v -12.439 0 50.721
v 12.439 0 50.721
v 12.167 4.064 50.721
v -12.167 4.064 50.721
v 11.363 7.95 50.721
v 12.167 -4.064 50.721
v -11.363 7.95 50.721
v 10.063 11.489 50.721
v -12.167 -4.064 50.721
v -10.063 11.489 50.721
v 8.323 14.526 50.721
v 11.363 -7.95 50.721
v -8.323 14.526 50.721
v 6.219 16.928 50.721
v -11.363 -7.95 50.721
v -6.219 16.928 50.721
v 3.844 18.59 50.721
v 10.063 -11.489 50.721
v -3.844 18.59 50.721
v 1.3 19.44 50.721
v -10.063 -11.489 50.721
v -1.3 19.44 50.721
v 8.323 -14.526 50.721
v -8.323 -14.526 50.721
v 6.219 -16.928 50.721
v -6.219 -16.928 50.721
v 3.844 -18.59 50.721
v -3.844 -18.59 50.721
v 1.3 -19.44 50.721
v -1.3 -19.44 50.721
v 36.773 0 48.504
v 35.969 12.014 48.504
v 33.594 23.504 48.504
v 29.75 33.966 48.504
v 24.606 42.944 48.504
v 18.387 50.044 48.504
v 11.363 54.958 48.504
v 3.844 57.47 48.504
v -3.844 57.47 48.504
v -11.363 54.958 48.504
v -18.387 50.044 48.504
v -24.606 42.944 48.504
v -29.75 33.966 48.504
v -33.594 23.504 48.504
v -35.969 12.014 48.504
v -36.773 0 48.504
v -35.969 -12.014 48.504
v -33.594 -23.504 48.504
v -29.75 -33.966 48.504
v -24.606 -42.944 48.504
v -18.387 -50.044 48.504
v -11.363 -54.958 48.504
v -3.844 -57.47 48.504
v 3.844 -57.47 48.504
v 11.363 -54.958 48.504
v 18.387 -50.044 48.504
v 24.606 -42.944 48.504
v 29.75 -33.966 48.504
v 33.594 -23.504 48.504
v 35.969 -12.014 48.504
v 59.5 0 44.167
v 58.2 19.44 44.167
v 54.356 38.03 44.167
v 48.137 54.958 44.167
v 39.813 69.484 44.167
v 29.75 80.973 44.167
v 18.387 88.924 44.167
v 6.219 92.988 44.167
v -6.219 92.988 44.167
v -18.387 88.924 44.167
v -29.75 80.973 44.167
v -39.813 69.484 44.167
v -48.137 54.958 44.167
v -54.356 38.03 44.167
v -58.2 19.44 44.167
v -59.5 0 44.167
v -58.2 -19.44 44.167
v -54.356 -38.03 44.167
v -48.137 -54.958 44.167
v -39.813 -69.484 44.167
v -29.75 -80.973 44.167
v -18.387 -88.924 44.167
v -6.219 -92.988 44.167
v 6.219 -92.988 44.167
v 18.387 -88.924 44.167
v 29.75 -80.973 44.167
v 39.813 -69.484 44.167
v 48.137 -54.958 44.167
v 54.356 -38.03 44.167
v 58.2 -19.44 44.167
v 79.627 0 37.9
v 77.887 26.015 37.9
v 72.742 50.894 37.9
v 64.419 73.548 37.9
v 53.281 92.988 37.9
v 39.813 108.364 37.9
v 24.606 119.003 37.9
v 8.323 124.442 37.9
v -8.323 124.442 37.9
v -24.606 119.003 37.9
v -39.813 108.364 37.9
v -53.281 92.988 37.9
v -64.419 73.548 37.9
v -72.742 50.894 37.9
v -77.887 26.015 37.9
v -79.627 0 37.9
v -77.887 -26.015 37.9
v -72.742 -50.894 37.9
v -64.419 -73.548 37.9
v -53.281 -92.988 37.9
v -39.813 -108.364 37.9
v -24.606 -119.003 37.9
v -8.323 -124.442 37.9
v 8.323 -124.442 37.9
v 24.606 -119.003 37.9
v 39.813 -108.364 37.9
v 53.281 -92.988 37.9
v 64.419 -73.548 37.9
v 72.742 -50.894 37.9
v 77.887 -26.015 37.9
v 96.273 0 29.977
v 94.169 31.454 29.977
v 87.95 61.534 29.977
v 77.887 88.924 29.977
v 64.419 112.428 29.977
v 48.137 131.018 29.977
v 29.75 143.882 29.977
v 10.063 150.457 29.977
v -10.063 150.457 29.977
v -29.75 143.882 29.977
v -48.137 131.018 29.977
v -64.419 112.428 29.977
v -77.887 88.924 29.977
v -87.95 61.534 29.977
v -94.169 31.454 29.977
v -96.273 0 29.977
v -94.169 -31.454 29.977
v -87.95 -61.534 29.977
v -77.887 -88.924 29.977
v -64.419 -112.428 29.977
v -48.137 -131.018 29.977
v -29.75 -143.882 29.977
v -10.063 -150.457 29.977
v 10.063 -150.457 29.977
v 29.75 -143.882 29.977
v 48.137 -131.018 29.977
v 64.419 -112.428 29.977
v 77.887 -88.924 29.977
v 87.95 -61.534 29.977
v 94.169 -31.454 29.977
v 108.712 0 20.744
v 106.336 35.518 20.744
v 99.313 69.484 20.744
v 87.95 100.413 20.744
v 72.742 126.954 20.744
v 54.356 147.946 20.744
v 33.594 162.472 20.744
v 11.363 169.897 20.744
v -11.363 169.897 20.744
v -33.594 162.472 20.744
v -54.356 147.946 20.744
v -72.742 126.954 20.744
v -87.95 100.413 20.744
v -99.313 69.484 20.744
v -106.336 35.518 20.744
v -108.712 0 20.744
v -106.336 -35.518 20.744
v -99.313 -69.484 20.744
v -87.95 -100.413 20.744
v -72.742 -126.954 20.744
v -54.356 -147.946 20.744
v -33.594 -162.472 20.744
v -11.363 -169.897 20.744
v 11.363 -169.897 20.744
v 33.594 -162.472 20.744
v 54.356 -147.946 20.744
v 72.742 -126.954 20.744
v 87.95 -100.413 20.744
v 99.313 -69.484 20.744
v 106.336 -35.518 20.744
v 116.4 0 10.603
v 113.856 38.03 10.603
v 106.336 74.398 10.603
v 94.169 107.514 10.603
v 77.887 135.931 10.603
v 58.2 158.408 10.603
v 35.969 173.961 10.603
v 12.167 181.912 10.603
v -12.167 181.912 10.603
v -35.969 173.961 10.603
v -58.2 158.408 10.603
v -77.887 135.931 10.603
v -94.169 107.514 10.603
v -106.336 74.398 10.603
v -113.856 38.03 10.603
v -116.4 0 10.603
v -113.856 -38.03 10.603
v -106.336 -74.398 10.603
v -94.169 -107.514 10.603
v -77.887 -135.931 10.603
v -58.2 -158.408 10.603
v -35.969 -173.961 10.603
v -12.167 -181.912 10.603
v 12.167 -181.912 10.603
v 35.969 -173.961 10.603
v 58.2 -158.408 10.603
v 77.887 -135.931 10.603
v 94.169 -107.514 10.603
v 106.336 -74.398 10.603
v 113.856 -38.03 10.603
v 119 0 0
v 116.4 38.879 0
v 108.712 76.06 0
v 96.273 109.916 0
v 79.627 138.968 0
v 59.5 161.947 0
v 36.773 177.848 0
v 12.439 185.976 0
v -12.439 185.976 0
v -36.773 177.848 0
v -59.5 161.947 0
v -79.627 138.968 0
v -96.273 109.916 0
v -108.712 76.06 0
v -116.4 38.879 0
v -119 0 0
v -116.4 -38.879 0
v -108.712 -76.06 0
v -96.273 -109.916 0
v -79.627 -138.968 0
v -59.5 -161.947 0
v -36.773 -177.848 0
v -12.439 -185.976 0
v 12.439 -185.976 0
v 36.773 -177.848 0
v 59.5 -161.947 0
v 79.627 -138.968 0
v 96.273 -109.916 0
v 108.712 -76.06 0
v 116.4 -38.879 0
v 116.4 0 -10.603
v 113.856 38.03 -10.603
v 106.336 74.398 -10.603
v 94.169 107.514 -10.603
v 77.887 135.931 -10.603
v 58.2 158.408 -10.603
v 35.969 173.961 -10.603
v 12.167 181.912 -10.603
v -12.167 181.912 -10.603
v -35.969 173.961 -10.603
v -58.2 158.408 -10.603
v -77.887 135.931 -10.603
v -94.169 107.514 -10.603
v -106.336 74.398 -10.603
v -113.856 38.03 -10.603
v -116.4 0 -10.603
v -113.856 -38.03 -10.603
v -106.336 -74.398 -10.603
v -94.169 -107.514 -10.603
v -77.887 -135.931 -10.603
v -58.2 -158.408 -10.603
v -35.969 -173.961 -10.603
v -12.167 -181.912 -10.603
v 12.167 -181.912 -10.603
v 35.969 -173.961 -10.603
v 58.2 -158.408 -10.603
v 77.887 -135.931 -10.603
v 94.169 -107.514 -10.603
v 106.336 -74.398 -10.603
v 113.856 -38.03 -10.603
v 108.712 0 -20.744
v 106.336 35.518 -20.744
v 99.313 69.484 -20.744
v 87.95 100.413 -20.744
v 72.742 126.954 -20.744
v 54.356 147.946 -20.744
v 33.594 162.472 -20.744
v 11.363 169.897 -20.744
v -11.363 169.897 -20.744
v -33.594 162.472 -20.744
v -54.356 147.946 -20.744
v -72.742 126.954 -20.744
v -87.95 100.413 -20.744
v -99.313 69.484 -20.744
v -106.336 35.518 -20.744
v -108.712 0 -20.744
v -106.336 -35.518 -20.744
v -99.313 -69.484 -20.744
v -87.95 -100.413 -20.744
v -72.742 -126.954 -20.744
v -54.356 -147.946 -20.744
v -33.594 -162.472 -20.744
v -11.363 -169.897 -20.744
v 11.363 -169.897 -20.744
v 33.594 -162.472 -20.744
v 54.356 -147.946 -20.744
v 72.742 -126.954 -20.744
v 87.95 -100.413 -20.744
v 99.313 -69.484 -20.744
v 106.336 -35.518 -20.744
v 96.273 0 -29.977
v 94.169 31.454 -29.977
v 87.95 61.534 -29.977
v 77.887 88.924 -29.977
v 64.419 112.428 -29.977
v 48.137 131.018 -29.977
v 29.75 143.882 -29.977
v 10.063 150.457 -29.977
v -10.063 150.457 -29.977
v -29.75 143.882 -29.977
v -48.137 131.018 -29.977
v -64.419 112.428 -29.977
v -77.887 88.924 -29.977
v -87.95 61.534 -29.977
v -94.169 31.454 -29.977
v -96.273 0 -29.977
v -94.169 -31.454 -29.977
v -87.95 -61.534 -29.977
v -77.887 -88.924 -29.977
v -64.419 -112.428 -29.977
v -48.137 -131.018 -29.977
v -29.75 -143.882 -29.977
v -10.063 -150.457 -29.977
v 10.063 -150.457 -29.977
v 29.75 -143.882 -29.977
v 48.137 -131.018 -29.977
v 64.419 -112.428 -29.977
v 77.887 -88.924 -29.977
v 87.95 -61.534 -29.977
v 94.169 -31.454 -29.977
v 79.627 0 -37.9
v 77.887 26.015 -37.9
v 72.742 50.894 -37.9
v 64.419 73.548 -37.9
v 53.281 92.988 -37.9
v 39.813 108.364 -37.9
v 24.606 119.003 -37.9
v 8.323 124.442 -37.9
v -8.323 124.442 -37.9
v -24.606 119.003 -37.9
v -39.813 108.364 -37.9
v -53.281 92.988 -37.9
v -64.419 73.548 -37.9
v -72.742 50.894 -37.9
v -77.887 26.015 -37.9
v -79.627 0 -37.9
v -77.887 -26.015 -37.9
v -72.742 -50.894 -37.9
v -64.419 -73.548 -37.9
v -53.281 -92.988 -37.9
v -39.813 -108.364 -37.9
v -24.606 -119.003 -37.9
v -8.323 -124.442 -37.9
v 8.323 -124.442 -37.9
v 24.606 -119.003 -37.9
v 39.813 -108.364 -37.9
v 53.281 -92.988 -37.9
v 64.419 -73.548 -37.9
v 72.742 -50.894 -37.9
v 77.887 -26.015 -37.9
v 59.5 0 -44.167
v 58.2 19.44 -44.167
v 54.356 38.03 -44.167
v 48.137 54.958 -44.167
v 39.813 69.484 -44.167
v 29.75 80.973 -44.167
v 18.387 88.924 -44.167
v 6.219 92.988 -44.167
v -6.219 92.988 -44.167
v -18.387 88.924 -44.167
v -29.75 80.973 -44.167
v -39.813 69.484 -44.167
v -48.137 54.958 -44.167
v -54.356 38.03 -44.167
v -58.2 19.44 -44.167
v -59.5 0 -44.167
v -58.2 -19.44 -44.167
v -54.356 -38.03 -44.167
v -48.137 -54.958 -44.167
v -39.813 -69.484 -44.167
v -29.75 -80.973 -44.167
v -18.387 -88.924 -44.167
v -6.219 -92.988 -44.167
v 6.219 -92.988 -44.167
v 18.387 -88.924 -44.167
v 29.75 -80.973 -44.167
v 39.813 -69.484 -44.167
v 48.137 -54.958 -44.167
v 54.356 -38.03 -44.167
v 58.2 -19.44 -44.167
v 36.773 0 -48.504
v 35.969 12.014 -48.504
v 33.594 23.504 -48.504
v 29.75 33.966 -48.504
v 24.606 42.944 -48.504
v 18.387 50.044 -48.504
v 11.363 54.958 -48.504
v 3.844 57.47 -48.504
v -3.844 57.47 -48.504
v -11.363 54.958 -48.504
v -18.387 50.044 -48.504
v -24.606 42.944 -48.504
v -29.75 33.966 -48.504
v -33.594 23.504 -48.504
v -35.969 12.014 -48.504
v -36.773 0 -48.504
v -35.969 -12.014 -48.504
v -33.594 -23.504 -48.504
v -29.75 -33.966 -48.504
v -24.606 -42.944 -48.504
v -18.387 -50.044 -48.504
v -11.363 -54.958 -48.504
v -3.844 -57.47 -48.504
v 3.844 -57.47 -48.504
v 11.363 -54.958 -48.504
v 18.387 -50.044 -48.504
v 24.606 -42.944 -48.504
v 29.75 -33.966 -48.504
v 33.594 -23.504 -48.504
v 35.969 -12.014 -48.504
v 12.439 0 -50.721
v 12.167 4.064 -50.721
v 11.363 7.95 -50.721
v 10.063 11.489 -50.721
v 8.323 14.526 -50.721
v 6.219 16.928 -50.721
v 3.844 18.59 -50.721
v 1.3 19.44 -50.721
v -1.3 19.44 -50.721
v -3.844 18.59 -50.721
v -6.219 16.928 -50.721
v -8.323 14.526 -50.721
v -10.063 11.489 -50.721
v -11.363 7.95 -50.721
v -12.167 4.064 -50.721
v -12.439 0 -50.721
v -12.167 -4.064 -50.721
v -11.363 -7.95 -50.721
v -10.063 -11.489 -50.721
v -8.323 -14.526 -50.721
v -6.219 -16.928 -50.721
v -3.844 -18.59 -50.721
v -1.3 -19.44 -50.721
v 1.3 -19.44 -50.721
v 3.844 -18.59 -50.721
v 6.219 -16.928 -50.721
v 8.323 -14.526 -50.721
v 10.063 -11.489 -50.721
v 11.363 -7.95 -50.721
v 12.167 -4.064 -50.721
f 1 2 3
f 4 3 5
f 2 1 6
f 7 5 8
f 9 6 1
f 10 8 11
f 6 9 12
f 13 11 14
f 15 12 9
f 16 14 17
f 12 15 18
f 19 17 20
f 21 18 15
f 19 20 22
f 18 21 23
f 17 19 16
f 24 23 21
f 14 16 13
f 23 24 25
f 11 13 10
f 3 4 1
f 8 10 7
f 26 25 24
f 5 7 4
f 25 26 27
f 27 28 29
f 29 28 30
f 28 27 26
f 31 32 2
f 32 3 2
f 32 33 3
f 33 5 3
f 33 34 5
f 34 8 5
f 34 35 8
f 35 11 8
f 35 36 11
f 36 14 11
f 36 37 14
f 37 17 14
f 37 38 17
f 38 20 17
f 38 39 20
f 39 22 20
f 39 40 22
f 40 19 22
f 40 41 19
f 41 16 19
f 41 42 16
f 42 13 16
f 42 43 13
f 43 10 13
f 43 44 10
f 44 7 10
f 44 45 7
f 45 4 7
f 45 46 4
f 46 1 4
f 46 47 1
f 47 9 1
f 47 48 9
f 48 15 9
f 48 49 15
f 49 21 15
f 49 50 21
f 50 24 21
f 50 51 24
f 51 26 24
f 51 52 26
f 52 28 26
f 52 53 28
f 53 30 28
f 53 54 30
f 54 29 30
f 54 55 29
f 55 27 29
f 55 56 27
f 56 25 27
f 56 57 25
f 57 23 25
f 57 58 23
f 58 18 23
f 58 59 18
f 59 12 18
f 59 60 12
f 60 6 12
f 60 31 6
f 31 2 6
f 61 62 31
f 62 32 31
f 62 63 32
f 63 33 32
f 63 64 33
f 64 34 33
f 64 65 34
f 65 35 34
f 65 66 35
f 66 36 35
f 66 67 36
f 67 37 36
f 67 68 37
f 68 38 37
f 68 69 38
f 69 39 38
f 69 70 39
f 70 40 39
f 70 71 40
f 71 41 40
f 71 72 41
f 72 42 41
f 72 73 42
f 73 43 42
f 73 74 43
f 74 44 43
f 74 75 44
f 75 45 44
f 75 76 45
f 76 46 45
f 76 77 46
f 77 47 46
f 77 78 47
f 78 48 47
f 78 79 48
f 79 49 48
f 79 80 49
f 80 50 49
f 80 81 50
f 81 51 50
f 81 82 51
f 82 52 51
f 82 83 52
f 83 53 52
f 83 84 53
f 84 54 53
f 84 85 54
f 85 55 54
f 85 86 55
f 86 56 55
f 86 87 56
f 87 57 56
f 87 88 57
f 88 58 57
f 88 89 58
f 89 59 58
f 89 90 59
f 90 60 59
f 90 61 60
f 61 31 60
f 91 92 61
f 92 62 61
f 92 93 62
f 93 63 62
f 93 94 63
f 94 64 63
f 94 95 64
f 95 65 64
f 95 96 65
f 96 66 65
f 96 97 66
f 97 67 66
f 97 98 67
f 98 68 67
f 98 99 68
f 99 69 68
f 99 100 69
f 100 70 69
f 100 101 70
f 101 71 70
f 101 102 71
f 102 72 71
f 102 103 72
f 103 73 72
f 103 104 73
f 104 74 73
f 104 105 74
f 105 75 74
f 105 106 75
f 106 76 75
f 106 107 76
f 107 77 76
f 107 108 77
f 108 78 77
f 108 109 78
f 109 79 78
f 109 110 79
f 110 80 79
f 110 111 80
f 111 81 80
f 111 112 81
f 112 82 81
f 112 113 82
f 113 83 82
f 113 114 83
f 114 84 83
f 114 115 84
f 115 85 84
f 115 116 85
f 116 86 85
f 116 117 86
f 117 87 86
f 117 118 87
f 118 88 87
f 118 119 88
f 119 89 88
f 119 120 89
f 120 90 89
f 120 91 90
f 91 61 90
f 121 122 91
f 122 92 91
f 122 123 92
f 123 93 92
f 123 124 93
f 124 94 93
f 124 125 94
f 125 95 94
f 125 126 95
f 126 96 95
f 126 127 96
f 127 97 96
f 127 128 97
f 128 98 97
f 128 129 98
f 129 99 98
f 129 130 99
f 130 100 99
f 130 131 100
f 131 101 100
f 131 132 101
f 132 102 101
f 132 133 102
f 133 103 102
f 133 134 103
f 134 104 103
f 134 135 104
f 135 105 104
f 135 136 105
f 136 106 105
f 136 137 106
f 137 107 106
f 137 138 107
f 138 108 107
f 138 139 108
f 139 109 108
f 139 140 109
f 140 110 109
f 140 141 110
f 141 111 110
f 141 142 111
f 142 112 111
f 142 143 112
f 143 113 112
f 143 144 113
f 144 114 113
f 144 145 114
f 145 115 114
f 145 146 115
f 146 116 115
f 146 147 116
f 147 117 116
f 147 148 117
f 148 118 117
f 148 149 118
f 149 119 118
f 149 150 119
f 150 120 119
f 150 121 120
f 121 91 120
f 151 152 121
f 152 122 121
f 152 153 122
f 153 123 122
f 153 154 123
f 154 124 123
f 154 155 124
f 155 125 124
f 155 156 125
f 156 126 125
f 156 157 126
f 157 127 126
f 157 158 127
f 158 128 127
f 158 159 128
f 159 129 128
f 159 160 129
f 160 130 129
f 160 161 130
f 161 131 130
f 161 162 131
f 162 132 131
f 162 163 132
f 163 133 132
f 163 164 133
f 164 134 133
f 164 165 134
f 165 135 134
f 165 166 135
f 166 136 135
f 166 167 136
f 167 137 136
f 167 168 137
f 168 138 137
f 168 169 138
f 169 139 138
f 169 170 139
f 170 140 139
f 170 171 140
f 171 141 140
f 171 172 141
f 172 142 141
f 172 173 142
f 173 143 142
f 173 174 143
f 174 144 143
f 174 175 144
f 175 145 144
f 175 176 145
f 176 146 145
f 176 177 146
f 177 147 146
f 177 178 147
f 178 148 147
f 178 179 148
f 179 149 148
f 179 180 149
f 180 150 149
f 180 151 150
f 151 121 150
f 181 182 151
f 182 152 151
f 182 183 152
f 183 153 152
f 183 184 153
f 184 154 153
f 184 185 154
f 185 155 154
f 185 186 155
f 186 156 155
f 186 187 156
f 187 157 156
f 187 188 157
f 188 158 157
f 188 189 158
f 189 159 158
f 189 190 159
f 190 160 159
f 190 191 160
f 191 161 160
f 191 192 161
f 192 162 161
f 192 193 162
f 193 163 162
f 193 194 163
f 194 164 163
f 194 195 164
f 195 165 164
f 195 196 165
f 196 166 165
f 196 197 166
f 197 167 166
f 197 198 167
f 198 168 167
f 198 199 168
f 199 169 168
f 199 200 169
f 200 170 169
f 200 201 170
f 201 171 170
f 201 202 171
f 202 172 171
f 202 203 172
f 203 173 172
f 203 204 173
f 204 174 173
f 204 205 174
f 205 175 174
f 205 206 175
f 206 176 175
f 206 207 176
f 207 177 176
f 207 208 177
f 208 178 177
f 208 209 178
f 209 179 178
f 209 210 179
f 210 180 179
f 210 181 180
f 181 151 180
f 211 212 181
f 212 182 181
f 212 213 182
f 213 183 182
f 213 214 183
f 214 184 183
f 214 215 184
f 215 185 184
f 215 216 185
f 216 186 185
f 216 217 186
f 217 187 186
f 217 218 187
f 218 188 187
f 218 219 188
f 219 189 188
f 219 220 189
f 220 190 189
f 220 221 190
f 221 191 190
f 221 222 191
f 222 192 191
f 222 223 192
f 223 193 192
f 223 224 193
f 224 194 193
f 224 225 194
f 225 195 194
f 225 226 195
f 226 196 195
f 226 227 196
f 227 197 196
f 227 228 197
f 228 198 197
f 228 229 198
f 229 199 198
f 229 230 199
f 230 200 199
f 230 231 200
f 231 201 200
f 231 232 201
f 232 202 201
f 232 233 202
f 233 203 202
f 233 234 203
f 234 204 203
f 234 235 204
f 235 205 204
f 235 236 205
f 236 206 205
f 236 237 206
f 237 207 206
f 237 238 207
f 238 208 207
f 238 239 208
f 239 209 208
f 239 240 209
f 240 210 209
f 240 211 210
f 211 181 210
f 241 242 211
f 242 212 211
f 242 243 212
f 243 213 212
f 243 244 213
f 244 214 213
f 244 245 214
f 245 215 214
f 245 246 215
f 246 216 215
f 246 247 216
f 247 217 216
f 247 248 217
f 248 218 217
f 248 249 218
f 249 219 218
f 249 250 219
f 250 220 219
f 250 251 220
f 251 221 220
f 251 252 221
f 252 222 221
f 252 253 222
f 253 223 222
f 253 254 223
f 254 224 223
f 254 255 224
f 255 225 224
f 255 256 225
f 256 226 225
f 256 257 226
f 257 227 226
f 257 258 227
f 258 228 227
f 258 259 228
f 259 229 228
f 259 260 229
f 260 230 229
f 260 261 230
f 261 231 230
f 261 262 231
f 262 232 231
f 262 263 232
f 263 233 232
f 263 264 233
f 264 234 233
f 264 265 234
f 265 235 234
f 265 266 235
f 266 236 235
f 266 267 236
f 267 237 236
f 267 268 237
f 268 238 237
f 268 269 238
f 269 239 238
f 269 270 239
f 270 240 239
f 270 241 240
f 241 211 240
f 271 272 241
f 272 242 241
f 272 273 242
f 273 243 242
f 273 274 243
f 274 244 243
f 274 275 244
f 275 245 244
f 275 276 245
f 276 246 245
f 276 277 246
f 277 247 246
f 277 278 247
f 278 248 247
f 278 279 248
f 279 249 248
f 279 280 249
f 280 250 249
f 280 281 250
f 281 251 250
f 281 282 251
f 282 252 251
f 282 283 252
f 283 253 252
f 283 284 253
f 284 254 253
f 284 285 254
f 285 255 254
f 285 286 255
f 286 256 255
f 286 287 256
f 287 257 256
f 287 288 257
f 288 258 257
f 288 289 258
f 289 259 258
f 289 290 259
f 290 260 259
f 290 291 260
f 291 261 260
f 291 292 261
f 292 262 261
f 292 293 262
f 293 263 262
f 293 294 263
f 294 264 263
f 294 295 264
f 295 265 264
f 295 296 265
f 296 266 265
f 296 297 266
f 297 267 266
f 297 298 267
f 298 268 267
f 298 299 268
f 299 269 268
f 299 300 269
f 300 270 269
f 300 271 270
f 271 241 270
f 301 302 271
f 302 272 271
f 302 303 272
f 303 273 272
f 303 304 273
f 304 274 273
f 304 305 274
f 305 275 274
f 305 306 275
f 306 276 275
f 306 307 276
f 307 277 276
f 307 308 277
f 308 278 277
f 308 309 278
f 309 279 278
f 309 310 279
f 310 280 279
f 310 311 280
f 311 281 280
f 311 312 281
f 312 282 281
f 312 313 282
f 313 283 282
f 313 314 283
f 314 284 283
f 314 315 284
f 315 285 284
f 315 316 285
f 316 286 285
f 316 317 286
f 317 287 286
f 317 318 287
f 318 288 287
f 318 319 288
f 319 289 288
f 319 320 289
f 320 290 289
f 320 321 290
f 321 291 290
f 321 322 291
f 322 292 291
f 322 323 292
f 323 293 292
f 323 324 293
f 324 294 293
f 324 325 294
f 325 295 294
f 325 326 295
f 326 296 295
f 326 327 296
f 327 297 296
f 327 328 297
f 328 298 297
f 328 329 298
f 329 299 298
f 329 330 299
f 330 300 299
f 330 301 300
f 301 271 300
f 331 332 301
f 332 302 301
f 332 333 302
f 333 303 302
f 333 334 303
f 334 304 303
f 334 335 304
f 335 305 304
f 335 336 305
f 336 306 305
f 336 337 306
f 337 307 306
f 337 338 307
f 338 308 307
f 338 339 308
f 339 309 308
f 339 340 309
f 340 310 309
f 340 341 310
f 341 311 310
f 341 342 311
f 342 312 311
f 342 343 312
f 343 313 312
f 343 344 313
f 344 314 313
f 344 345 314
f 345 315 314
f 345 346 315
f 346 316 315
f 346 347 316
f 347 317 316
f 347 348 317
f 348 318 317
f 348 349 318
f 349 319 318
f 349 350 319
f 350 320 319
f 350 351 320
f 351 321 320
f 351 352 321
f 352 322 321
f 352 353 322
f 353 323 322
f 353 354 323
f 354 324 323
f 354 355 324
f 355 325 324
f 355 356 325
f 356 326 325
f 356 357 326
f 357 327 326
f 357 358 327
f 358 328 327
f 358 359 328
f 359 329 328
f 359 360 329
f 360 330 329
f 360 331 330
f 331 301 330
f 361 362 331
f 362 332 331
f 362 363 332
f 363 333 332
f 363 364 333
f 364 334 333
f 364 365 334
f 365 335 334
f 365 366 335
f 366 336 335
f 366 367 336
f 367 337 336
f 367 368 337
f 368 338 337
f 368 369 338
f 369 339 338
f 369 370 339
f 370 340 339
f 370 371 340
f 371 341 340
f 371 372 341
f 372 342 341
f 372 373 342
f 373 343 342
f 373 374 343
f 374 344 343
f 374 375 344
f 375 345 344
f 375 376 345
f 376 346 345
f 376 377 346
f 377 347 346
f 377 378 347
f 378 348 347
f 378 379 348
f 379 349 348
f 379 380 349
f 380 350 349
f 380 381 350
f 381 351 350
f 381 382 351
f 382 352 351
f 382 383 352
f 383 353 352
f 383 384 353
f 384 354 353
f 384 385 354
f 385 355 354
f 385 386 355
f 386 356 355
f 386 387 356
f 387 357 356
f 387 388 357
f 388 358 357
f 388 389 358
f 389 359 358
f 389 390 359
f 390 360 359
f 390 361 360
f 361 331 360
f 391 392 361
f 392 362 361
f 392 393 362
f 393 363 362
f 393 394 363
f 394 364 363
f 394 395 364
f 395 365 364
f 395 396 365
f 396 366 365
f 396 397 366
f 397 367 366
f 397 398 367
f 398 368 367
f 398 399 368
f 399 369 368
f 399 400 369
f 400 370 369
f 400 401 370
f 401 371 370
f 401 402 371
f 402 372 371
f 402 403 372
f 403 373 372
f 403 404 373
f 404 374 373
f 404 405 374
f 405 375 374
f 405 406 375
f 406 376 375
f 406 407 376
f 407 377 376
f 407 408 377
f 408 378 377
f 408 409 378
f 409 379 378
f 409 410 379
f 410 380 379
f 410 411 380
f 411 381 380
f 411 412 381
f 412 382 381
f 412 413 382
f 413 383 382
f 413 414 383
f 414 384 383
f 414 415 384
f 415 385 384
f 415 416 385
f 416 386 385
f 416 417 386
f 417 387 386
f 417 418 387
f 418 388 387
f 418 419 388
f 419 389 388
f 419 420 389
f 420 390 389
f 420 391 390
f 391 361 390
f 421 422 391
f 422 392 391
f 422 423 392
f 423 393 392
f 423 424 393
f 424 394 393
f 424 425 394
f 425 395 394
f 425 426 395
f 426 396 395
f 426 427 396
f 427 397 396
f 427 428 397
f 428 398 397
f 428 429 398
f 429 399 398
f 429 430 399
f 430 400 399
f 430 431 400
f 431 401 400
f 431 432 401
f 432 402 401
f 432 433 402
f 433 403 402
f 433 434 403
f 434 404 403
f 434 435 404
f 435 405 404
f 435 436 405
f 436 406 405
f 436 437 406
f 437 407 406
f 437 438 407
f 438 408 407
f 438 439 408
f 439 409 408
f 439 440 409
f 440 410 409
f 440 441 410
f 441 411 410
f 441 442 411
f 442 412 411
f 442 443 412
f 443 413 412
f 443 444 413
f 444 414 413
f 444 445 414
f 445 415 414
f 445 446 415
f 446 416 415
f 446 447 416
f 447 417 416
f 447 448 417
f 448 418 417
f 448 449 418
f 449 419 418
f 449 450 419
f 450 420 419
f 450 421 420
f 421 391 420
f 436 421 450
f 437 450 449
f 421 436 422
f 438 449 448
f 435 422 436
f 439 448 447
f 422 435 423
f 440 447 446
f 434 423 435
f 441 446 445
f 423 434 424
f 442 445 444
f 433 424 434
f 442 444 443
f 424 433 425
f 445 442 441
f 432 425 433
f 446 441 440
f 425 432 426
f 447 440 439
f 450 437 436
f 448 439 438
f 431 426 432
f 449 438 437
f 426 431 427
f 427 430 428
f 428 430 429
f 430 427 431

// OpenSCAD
// Generated by SolidPython 1.0.1 on 2020-07-29 00:46:47


scale(v = [7, 11, 3]) {
	sphere(r = 17);
}
/***********************************************
*********      SolidPython code:      **********
************************************************
 
# import packages: SolidPython
from solid import *
from solid.utils import *
from itertools import chain, combinations, permutations


class Resize:

    def __init__(self, scad_file):
        self.scad_file = scad_file
        #self.scad_file = import_scad(scad_file)
        # cone/cylinder param:
        self.r1 = 0
        self.r2 = 0
        self.h = 0
        # rectangular prism param:
        self.w = 0
        self.l = 0
        # ellipse param:
        self.r = 0

    # import OpenScad code (file name corresponds to shape)


    # classify shape + parameters
    def assign(self, param1, param2, param3):
        if self.scad_file == 'cone.scad':
            self.r1 = param1
            self.r2 = param2
            self.h = param3
        elif self.scad_file == 'cylinder.scad':
            self.r1 = param1
            self.r2 = param2
            self.h = param3
        elif self.scad_file == 'rectangularPrism.scad':
            self.h = param1
            self.l = param2
            self.w = param3
        else:
            self.r = param1
            self.h = param2

    # resize parameters
    def iterate(self):
        x = range(3, 20, 2)
        i = 1
        if self.scad_file == 'cone.scad':
            tempList = list(permutations(x, 2))
            for temp in tempList:
                param1 = temp[0]
                param2 = temp[1]
                filepath = 'produced_scad_files/' + 'cone' + str(param1) + '_' + str(param2) + '_' + '.scad'
                scad_render_to_file(cylinder(h=param1, r1=param2, r2=0), filepath)

        elif self.scad_file == 'cylinder.scad':
            tempList = list(permutations(x, 3))
            for temp in tempList:
                param1 = temp[0]
                param2 = temp[1]
                filepath = 'produced_scad_files/' + 'cylinder' + str(param1) + '_' + str(param2) + '_' + '.scad'
                scad_render_to_file(cylinder(h=param1, r1=param2, r2=param2), filepath)

        elif self.scad_file == 'rectangularPrism.scad':
            tempList = list(permutations(x, 3))
            for temp in tempList:
                param1 = temp[0]
                param2 = temp[1]
                param3 = temp[2]
                filepath = 'produced_scad_files/' + 'rectangularPrism' + str(param1) + '_' + str(param2) + '_' + str(
                    param3) + '.scad'
                scad_render_to_file(cube(size=(param1, param2, param3)), filepath)

        elif self.scad_file == 'ellipse.scad':
            tempList = list(permutations(x, 4))
            for temp in tempList:
                param1 = temp[0]
                param2 = temp[1]
                param3 = temp[2]
                param4 = temp[3]
                filepath = 'produced_scad_files/' + 'ellipse' + str(param1) + '_' + str(param2) + '_' + str(param3) + '_' + str(param4) + '.scad'
                scad_render_to_file(scale([param1, param2, param3])(sphere(r=param4)), filepath)

    def render_to_scadfile(self):
        scad_render_to_file(scad, 'example.scad') 
 
************************************************/
